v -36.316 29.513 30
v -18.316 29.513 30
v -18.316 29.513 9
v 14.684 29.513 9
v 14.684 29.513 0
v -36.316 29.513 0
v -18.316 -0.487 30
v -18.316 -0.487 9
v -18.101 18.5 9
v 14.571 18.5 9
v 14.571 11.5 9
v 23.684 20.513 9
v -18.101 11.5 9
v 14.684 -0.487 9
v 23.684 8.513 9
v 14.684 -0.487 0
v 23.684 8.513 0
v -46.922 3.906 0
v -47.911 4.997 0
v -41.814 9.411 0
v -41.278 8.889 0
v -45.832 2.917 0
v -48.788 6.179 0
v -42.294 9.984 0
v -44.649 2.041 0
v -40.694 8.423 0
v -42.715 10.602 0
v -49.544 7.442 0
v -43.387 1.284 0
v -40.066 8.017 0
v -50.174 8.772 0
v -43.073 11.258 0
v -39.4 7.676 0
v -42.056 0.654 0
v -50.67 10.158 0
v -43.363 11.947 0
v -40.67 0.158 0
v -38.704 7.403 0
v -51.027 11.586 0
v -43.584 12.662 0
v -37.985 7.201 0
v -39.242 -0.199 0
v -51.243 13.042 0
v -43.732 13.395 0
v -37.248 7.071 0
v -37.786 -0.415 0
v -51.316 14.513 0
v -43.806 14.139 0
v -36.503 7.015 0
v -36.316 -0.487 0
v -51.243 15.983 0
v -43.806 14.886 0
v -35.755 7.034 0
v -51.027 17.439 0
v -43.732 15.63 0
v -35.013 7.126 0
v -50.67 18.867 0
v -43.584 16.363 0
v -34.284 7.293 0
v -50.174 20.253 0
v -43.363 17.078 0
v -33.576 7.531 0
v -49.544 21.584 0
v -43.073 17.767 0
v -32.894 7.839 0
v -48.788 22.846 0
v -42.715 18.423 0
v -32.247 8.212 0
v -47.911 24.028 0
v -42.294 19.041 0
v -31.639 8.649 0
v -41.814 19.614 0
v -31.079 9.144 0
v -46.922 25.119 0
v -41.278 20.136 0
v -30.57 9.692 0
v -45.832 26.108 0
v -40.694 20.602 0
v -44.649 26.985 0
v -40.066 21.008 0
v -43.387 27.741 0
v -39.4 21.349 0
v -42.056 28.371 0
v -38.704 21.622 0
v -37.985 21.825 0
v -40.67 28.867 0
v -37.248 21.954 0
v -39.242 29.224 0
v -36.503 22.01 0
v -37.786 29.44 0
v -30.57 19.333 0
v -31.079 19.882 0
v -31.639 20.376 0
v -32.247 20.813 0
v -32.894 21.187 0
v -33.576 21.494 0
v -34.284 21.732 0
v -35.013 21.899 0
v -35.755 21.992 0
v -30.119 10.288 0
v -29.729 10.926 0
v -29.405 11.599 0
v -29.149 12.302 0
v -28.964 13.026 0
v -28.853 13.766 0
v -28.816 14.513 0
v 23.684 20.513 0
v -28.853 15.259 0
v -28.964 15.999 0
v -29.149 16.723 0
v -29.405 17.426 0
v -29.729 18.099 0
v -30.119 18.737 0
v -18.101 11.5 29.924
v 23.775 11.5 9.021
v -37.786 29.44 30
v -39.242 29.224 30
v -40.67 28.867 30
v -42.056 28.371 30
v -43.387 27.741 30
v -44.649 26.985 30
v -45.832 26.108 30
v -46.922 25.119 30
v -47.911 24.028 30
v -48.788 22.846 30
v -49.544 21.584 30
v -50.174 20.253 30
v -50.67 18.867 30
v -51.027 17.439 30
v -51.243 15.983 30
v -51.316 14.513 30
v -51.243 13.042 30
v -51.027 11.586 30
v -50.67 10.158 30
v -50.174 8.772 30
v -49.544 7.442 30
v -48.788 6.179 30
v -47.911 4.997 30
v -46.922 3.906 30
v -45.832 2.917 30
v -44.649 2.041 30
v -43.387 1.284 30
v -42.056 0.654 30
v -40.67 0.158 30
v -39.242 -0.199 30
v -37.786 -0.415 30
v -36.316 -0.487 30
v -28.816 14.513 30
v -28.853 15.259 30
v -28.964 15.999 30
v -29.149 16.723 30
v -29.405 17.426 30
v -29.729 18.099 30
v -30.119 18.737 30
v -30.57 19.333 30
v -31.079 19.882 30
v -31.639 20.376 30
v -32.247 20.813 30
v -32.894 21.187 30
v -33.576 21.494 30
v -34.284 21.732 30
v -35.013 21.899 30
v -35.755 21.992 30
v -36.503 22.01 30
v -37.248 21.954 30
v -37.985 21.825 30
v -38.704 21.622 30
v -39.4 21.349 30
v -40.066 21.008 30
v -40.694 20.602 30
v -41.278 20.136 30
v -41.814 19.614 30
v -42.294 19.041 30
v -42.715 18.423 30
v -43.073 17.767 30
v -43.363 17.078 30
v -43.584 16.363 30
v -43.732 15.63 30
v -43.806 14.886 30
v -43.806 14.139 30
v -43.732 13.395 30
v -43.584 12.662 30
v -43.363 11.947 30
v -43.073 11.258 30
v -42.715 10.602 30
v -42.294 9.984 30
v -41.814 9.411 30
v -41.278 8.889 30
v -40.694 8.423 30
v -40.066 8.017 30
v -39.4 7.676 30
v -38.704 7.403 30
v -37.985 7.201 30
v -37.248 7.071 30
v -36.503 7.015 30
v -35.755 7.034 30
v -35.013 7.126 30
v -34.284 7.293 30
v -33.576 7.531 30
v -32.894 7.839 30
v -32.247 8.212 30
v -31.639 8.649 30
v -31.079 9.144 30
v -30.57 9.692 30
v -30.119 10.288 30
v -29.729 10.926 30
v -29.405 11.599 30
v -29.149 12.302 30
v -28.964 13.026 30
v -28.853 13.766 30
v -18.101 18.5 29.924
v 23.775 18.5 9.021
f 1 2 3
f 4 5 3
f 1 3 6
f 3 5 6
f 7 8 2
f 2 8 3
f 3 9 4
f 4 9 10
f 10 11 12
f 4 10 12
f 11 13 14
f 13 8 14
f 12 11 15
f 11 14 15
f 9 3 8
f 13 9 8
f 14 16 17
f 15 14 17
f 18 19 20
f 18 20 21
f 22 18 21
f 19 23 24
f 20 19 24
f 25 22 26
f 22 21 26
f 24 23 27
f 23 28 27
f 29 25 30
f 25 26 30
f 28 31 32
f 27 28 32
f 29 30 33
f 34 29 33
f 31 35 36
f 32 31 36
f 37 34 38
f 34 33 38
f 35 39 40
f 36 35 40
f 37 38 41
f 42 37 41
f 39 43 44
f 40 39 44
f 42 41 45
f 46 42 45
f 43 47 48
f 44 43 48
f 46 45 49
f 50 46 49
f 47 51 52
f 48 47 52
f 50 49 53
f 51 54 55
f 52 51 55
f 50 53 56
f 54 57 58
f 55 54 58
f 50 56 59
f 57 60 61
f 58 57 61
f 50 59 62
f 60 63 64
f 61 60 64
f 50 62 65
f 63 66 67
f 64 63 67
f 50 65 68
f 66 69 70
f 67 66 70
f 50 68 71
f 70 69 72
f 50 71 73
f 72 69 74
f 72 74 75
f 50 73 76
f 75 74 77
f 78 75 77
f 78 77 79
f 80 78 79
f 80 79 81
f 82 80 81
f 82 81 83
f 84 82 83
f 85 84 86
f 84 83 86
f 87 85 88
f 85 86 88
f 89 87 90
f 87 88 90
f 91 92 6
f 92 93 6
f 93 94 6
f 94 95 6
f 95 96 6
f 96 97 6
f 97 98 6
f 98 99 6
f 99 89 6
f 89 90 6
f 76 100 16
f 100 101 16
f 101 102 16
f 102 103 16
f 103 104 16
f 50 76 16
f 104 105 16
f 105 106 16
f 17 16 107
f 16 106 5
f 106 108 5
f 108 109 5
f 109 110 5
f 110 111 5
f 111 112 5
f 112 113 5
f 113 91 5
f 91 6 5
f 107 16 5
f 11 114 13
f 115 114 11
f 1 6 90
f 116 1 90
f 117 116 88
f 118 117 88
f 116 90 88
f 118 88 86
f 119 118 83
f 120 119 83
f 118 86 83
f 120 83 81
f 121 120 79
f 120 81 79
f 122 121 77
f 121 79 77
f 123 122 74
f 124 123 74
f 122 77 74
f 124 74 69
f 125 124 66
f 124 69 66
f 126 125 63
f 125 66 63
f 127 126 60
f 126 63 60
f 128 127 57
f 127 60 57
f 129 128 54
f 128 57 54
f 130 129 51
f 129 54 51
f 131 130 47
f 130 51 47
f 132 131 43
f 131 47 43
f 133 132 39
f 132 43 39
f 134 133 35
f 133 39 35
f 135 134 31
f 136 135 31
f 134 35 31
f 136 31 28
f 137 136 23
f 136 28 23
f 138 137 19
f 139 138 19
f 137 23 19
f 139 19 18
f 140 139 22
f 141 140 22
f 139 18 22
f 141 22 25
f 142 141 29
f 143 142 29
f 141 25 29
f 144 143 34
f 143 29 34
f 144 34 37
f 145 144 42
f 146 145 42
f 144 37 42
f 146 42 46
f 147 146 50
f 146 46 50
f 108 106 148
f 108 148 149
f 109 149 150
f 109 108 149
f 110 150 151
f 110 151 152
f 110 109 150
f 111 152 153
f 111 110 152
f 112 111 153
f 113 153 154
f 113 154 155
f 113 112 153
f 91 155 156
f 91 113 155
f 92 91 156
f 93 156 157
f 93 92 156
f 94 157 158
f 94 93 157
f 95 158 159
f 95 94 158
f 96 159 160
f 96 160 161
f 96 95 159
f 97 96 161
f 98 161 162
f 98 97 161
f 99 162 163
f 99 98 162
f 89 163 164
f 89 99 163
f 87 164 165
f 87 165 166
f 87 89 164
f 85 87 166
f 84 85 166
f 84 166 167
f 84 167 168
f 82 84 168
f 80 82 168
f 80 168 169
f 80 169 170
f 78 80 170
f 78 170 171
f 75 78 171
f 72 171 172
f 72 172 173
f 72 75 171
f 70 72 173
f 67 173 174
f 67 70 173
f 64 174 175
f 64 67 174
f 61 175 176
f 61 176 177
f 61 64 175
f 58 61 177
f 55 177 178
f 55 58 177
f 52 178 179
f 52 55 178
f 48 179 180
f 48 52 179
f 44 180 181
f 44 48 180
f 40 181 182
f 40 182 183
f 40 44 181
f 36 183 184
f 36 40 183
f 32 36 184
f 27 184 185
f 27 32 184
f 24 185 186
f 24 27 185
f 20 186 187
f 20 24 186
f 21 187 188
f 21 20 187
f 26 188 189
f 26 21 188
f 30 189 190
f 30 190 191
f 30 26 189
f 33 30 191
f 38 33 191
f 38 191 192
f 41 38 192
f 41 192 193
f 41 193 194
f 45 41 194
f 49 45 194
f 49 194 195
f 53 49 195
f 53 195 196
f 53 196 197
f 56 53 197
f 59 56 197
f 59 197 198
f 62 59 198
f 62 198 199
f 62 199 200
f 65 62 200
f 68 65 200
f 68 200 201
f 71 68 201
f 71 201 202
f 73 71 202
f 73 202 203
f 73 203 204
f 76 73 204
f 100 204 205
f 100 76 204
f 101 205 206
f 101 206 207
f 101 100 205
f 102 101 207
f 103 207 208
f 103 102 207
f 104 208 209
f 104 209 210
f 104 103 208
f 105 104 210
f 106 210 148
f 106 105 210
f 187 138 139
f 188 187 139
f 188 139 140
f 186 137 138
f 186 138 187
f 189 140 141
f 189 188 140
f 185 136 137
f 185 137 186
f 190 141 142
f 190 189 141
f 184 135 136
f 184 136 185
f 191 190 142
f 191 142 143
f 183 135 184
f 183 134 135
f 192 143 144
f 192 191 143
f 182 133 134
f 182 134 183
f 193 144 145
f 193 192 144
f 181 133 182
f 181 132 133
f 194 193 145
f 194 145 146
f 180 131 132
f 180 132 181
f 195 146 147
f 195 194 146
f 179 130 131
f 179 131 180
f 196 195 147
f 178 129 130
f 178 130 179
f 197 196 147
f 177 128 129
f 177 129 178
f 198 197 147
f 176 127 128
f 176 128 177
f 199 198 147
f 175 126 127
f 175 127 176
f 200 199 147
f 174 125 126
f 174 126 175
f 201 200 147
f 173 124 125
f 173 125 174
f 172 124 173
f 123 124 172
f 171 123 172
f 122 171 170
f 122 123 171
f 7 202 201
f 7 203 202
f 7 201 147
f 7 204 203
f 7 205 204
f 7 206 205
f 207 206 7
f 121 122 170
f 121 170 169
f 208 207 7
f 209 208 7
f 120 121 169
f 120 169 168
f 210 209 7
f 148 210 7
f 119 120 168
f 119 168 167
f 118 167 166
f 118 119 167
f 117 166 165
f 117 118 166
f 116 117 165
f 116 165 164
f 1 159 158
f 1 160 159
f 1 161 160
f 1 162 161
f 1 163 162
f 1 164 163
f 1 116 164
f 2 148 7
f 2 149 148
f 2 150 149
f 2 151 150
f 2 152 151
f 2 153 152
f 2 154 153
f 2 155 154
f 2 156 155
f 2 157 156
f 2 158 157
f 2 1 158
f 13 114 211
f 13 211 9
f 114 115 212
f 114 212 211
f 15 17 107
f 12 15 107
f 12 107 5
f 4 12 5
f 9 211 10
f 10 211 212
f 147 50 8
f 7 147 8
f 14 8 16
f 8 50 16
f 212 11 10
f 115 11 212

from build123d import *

# Parameters (mm, degrees)
F0_W     = 42
F0_H     = 7
F1_DEPTH = 9
F0_R     = 7.5
F2_DEPTH = 30
F4_DEPTH = 18.5
F5_DEPTH = 11.5


with BuildPart() as f1:
    # F0 (on Top) → F1 (new body)
    with BuildSketch(Plane.XY):
        Polygon((-18.315635, 11.012554), (-18.315635, -0.487446), (14.684365, -0.487446), (23.684365, 8.512554), (23.684365, 11.012554), align=None)
        Polygon((14.684365, 29.512554), (-18.315635, 29.512554), (-18.315635, 18.012554), (23.684365, 18.012554), (23.684365, 20.512554), align=None)
        with Locations((2.684365, 14.512554)):
            Rectangle(F0_W, F0_H)
    extrude(amount=F1_DEPTH)

    # F0 (on Top) → F2 (join)
    with BuildSketch(Plane.XY):
        with BuildLine():
            Line((-18.315635, 29.512554), (-36.315635, 29.512554))
            ThreePointArc((-36.315635, 29.512554), (-51.315635, 14.512554), (-36.315635, -0.487446))
            Line((-36.315635, -0.487446), (-18.315635, -0.487446))
            Line((-18.315635, -0.487446), (-18.315635, 11.012554))
            Line((-18.315635, 11.012554), (-18.315635, 18.012554))
            Line((-18.315635, 18.012554), (-18.315635, 29.512554))
        make_face()
        with Locations((-36.315635, 14.512554)):
            Circle(F0_R, mode=Mode.SUBTRACT)
    extrude(amount=F2_DEPTH)

    # F3 (on Front) → F4 (join)
    with BuildSketch(Plane.XZ):
        Polygon((23.775358, 9.021481), (-18.101137, 29.923748), (-18.101137, 8.923748), align=None)
    extrude(amount=-F4_DEPTH)

    # F4_face (on face) → F5 (cut)
    with BuildSketch(Plane(origin=(-4.133589, 0, 15.976161), x_dir=(1, 0, 0), z_dir=(0, -1, 0))):
        Polygon((18.704939, -6.976161), (27.908947, -6.95468), (-13.967548, 13.947587), (-13.967548, -6.976161), align=None)
    extrude(amount=-F5_DEPTH, mode=Mode.SUBTRACT)


solid = f1.part
